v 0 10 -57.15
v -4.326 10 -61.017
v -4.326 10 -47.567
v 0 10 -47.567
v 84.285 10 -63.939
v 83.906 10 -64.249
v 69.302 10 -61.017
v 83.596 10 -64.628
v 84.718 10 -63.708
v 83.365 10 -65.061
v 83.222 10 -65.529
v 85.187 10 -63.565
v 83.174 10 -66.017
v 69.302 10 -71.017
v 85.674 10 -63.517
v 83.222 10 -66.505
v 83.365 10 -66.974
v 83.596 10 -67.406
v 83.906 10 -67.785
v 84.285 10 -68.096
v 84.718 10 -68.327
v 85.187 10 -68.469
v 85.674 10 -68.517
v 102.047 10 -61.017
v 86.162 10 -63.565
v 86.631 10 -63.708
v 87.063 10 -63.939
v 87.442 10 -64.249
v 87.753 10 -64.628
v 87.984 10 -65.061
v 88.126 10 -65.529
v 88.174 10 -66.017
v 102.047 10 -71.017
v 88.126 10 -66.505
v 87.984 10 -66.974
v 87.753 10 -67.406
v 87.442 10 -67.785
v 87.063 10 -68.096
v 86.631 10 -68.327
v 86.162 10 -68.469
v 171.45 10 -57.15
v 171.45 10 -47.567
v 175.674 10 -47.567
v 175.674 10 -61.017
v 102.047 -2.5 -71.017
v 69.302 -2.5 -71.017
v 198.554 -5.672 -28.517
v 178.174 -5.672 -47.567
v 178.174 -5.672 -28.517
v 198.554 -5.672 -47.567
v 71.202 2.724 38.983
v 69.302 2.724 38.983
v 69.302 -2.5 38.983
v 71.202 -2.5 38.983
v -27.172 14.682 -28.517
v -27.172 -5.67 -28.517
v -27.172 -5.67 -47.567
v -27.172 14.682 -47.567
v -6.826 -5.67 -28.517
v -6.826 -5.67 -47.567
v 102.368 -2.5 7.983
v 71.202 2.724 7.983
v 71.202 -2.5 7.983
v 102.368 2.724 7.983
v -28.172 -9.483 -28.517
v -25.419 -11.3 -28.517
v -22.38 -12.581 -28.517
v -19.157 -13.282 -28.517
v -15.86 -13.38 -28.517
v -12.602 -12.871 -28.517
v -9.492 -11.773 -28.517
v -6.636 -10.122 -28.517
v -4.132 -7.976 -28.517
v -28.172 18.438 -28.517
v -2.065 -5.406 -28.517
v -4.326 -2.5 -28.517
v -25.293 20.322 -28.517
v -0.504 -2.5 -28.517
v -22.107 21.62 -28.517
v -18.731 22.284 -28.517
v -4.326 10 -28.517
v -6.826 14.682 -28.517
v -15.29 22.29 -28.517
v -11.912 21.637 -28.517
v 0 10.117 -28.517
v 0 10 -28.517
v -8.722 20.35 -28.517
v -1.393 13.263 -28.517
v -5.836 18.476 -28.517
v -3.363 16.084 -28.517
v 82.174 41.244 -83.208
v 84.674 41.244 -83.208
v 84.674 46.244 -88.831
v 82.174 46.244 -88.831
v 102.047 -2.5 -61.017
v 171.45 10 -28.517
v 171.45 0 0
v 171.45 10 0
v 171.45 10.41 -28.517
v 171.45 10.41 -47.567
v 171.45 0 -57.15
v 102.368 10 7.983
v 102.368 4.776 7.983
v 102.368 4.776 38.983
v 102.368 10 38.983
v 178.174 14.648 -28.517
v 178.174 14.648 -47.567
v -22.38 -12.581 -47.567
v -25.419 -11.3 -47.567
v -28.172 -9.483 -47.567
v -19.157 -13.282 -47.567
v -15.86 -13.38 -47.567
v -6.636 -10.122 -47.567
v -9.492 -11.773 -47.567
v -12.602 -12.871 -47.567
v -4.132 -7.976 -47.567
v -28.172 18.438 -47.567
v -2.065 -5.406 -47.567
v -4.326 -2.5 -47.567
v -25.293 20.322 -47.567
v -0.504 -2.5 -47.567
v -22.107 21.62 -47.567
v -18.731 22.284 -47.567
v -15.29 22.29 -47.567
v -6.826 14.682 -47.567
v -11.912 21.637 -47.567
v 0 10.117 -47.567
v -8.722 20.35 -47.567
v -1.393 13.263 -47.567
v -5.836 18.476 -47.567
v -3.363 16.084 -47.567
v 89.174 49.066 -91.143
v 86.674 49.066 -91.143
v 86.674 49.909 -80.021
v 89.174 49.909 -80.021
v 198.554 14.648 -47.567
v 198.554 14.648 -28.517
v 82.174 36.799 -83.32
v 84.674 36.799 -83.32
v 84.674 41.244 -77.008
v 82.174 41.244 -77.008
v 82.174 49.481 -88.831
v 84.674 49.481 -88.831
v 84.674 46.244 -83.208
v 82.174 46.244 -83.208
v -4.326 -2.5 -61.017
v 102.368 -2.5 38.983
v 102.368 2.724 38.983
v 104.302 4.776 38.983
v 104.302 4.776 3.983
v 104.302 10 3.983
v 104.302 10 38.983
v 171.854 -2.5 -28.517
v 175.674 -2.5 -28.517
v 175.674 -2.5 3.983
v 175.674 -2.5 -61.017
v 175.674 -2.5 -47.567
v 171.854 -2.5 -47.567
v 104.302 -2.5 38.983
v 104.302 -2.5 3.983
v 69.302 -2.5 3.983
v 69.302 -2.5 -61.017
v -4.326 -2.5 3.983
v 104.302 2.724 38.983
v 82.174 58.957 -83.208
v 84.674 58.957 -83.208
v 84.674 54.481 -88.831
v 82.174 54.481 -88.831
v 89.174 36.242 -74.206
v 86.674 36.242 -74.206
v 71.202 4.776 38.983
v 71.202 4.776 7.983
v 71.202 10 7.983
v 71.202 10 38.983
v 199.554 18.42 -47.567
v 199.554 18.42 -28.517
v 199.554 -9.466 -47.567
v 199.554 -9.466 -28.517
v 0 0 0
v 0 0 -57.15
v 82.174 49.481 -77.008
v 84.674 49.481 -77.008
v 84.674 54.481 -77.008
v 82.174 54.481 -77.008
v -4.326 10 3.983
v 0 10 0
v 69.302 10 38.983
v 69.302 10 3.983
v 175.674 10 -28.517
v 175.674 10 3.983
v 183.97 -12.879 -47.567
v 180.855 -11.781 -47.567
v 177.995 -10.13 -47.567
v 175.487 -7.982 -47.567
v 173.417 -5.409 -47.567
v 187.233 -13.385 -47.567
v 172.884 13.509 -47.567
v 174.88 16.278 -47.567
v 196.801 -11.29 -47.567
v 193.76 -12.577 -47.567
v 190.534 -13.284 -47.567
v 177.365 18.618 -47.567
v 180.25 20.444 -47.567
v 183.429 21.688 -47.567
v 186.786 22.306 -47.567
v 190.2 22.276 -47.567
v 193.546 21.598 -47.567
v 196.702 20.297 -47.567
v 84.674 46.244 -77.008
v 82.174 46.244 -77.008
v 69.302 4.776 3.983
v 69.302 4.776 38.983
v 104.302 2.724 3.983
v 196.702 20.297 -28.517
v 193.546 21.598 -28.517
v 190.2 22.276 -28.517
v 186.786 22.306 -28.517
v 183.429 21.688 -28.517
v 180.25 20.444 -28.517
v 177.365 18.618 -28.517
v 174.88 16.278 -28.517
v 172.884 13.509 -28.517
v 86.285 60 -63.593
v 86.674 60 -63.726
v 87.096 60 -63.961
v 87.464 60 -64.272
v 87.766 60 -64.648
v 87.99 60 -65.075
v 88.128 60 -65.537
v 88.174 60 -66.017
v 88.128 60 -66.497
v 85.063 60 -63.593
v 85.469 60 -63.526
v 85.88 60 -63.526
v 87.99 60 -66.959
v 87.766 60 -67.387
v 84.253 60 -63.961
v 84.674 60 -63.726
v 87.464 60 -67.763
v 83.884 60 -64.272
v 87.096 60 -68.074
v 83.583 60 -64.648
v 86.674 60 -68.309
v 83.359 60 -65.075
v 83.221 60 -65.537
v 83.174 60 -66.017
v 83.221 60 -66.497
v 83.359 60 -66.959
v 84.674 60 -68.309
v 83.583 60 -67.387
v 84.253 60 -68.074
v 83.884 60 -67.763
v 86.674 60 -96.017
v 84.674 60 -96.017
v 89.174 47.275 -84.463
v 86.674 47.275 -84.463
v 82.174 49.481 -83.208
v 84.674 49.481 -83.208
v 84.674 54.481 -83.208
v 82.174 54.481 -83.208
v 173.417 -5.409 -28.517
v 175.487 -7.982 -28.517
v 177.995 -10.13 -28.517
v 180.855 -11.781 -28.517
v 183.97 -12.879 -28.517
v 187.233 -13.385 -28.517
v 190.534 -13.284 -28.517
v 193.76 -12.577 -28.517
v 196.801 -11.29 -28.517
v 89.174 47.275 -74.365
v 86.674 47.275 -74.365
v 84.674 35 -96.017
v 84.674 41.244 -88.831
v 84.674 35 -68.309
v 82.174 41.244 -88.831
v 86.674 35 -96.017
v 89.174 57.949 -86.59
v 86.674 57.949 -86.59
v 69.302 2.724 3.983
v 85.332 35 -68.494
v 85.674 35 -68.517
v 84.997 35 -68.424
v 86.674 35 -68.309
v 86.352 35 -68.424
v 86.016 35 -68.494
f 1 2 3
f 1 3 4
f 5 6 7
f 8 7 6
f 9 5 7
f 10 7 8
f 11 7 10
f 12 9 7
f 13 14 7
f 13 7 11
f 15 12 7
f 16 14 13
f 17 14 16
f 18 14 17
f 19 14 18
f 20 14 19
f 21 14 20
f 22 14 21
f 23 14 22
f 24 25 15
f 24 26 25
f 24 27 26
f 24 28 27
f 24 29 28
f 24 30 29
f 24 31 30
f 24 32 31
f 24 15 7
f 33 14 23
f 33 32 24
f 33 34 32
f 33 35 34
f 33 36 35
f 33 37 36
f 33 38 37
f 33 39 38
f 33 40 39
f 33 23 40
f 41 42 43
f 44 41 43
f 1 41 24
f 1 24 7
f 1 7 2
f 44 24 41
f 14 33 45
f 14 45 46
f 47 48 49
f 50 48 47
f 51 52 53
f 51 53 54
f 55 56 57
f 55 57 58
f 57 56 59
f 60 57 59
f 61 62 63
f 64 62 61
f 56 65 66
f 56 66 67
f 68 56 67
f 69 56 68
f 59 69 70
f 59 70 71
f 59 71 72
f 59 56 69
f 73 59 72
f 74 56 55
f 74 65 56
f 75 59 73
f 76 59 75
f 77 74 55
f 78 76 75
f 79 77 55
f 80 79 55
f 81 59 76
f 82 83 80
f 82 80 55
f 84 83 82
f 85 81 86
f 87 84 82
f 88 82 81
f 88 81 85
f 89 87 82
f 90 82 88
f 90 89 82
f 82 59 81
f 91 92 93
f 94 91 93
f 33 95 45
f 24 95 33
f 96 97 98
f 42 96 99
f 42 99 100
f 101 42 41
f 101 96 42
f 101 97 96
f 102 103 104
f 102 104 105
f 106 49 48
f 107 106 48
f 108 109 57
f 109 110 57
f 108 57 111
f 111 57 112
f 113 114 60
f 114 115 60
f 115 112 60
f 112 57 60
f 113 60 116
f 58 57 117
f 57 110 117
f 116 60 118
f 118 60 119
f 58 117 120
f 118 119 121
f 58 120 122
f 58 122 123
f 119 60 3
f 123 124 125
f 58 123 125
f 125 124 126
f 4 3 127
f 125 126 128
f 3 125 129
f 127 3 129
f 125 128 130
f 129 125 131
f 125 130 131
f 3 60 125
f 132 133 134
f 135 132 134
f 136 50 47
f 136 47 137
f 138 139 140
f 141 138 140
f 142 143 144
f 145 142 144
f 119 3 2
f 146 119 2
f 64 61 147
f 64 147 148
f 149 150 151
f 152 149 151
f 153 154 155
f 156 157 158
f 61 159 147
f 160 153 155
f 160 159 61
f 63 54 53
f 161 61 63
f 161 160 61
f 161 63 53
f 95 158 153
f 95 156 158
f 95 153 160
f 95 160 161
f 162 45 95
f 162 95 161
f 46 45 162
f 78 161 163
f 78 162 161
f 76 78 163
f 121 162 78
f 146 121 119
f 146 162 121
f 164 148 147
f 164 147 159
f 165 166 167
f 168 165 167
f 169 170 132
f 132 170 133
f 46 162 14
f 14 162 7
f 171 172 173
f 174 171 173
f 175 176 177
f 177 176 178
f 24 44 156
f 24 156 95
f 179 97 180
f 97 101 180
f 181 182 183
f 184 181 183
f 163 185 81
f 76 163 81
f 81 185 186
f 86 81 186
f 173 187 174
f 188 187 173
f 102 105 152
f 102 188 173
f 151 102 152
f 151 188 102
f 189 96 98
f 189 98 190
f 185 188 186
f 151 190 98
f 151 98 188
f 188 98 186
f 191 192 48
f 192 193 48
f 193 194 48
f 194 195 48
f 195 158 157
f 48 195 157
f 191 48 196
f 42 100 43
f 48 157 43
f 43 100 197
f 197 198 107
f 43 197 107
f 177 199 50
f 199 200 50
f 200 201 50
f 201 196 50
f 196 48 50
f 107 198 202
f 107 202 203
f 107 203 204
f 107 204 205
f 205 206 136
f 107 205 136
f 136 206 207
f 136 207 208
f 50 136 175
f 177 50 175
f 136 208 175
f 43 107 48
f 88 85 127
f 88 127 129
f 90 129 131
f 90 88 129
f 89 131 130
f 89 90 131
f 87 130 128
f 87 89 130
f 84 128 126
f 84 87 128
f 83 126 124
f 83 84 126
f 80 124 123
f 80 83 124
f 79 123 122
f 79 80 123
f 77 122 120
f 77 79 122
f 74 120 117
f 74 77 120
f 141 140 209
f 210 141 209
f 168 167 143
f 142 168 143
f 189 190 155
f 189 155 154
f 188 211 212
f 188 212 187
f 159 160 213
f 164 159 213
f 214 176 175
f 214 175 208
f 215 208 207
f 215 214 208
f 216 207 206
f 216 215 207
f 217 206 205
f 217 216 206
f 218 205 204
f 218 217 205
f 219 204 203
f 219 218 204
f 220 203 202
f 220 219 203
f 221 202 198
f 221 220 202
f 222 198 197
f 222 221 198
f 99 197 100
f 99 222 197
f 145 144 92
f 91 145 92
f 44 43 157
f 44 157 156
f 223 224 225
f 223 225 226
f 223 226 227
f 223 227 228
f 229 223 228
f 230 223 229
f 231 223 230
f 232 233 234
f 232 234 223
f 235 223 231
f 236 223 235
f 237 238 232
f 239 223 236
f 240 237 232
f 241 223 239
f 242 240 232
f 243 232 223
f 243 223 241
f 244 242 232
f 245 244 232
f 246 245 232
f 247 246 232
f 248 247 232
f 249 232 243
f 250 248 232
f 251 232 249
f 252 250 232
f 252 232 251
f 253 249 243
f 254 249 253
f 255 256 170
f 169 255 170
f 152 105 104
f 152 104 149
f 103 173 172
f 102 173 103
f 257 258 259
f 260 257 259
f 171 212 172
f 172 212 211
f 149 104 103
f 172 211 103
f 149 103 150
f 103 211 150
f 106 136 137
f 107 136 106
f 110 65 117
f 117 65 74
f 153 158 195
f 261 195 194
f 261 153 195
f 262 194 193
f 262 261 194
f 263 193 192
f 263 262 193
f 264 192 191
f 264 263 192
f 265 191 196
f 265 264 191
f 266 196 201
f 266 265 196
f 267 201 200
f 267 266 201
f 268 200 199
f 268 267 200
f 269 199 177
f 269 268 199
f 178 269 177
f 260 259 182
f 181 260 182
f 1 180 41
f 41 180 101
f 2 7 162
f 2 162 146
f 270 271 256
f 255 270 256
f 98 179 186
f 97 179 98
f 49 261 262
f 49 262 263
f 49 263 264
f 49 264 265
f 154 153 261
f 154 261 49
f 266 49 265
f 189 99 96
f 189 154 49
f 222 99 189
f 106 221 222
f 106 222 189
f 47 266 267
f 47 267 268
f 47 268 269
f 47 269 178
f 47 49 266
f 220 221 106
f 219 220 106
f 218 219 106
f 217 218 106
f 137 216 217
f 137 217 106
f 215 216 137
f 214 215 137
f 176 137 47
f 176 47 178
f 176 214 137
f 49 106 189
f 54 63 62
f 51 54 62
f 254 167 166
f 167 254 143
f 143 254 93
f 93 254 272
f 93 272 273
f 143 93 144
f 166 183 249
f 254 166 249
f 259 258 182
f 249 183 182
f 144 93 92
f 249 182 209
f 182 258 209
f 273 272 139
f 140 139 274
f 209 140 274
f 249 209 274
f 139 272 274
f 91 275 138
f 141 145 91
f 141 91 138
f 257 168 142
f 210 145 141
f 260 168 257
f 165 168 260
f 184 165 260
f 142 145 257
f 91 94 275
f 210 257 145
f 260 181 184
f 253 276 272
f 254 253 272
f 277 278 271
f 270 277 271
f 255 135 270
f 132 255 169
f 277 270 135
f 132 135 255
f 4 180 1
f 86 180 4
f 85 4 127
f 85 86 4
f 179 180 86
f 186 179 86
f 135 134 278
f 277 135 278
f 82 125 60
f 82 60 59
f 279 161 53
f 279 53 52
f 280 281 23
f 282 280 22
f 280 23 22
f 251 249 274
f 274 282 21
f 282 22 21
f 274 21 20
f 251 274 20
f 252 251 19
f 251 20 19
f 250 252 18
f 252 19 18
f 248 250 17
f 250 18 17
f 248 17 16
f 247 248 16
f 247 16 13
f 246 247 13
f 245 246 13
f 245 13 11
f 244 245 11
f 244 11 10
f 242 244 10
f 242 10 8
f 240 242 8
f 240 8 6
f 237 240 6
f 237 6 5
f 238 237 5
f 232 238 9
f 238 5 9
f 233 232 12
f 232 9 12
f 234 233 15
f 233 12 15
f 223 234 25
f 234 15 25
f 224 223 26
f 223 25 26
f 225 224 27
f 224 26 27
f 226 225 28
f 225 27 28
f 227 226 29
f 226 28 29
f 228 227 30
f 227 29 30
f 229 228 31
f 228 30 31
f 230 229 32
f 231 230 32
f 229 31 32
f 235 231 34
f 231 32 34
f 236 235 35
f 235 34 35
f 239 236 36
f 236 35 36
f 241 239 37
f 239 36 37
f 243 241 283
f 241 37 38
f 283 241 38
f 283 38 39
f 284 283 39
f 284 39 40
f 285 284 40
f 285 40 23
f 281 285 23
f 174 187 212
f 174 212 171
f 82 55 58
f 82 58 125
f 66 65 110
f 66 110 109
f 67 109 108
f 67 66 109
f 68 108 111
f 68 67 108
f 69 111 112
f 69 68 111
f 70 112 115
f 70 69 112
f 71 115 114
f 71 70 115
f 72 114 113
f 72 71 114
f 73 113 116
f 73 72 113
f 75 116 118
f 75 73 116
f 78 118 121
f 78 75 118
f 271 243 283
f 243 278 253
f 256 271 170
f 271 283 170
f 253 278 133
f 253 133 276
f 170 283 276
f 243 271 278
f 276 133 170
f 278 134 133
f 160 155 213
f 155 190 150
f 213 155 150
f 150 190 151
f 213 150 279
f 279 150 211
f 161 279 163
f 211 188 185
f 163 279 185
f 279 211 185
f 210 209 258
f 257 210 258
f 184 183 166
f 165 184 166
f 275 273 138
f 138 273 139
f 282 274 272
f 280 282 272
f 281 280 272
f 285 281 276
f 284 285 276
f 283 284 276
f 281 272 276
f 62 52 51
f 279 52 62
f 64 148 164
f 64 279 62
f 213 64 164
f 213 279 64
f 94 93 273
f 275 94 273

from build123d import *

# Parameters (mm, degrees)
SKETCH1_W            = 180
SKETCH1_H            = 65
SKETCH1_W_2          = 171.45
SKETCH1_H_2          = 57.15
BOSS_EXTRUDE1_DEPTH  = 10
SKETCH2_W            = 180
SKETCH2_H            = 65
BOSS_EXTRUDE2_DEPTH  = 2.5
SKETCH3_W            = 19.05
SKETCH3_H            = 4.647704017
SKETCH3_H_2          = 3.172295983
BOSS_EXTRUDE3_DEPTH  = 2.5
SKETCH4_W            = 2.440634246
SKETCH4_H            = 20.32
BOSS_EXTRUDE4_DEPTH  = 19.05
SKETCH5_W            = 19.05
SKETCH5_H            = 25.298590684
BOSS_EXTRUDE5_DEPTH  = 2.5
BOSS_EXTRUDE6_DEPTH  = 19.05
SKETCH7_W            = 35
SKETCH7_H            = 5.223578232
BOSS_EXTRUDE7_DEPTH  = 4
SKETCH8_W            = 1.900028328
SKETCH8_H            = 5.223578232
SKETCH8_W_2          = 1.933775308
BOSS_EXTRUDE8_DEPTH  = 35
SKETCH9_W            = 25.32
SKETCH9_H            = 2.501981816
BOSS_EXTRUDE9_DEPTH  = 19.05
SKETCH10_W           = 20.346164675
SKETCH10_H           = 20.35236298
SKETCH10_W_2         = 20.379365754
SKETCH10_H_2         = 20.32
BOSS_EXTRUDE10_DEPTH = 19.05
SKETCH11_W           = 21.053847509
SKETCH11_H           = 26.24333769
SKETCH11_W_2         = 20.65238494
SKETCH11_H_2         = 27.151183987
CUT_EXTRUDE1_DEPTH   = 219.146485719
SKETCH12_W           = 32.74513921
SKETCH12_H           = 12.5
BOSS_EXTRUDE11_DEPTH = 10
SKETCH13_R           = 2.5
BOSS_EXTRUDE12_DEPTH = 50
BOSS_EXTRUDE13_START = -25
BOSS_EXTRUDE13_DEPTH = 25
BOSS_EXTRUDE14_DEPTH = 2.5
BOSS_EXTRUDE15_DEPTH = 2.5


with BuildPart() as part:
    # Sketch1 → Boss-Extrude1 (new body)
    with BuildSketch(Plane(origin=(0, 0, 0), x_dir=(1, 0, 0), z_dir=(0, 1, 0))):
        with Locations((85.674229947, 28.51722294)):
            Rectangle(SKETCH1_W, SKETCH1_H)
        with Locations((85.725, 28.575)):
            Rectangle(SKETCH1_W_2, SKETCH1_H_2, mode=Mode.SUBTRACT)
    extrude(amount=BOSS_EXTRUDE1_DEPTH)

    # Sketch2 → Boss-Extrude2 (add)
    with BuildSketch(Plane(origin=(0, 0, 0), x_dir=(-1, 0, 0), z_dir=(0, -1, 0))):
        with Locations((-85.674229947, 28.51722294)):
            Rectangle(SKETCH2_W, SKETCH2_H)
    extrude(amount=BOSS_EXTRUDE2_DEPTH)

    # Sketch3 → Boss-Extrude3 (add)
    with BuildSketch(Plane(origin=(175.674229947, 0, 0), x_dir=(0, 0, -1), z_dir=(1, 0, 0))):
        with Locations((38.04222294, 12.323852009)):
            Rectangle(SKETCH3_W, SKETCH3_H)
        Polygon((28.51722294, 10), (28.51722294, 3.75), (28.51722294, -2.5), (47.56722294, -2.5), (47.56722294, 10), align=None)
        with Locations((38.04222294, -4.086147992)):
            Rectangle(SKETCH3_W, SKETCH3_H_2)
    extrude(amount=BOSS_EXTRUDE3_DEPTH)

    # Sketch4 → Boss-Extrude4 (add)
    with BuildSketch(Plane(origin=(0, 0, -47.56722294), x_dir=(-1, 0, 0), z_dir=(0, 0, -1))):
        Polygon((-200.994229947, 17.126484518), (-200.994229947, 14.647704017), (-198.553595701, 14.647704017), (-178.174229947, 14.647704017), (-175.674229947, 14.647704017), (-175.674229947, 17.126484518), align=None)
        with Locations((-199.773912824, 4.487704017)):
            Rectangle(SKETCH4_W, SKETCH4_H)
        Polygon((-198.553595701, -5.672295983), (-200.994229947, -5.672295983), (-200.994229947, -8.172106166), (-175.674229947, -8.172106166), (-175.674229947, -5.672295983), (-178.174229947, -5.672295983), align=None)
    extrude(amount=-BOSS_EXTRUDE4_DEPTH)

    # Sketch5 → Boss-Extrude5 (add)
    with BuildSketch(Plane.ZY.offset(4.325770053)):
        with Locations((-38.04222294, 4.477189176)):
            Rectangle(SKETCH5_W, SKETCH5_H)
    extrude(amount=BOSS_EXTRUDE5_DEPTH)

    # Sketch6 → Boss-Extrude6 (add)
    with BuildSketch(Plane.XY.offset(-28.51722294)):
        Polygon((-29.645770053, -8.172106166), (-27.171934728, -8.172106166), (-27.171934728, 14.68223863), (-4.325770053, 14.68223863), (-4.325770053, 17.115716116), (-29.645770053, 17.115716116), align=None)
    extrude(amount=-BOSS_EXTRUDE6_DEPTH)

    # Sketch7 → Boss-Extrude7 (add)
    with BuildSketch(Plane.XY.offset(3.98277706)):
        with Locations((86.801660342, 7.388210884)):
            Rectangle(SKETCH7_W, SKETCH7_H)
        with Locations((86.801660342, 0.111789116)):
            Rectangle(SKETCH7_W, SKETCH7_H)
    extrude(amount=BOSS_EXTRUDE7_DEPTH)

    # Sketch8 → Boss-Extrude8 (add)
    with BuildSketch(Plane.XY.offset(3.98277706)):
        with Locations((70.251674506, 7.388210884)):
            Rectangle(SKETCH8_W, SKETCH8_H)
        with Locations((70.251674506, 0.111789116)):
            Rectangle(SKETCH8_W, SKETCH8_H)
        with Locations((103.334772688, 0.111789116)):
            Rectangle(SKETCH8_W_2, SKETCH8_H)
        with Locations((103.334772688, 7.388210884)):
            Rectangle(SKETCH8_W_2, SKETCH8_H)
    extrude(amount=BOSS_EXTRUDE8_DEPTH)

    # Sketch9 → Boss-Extrude9 (add)
    with BuildSketch(Plane.XY.offset(-28.51722294)):
        with Locations((-16.985770053, -6.921115258)):
            Rectangle(SKETCH9_W, SKETCH9_H)
    extrude(amount=-BOSS_EXTRUDE9_DEPTH)

    # Sketch10 → Boss-Extrude10 (add)
    # profile 1 of 2: a face of its own
    with BuildSketch(Plane.XY.offset(-28.51722294)):
        with BuildLine():
            ThreePointArc((0, 10.117261054), (-34.872965087, 4.477189176), (0, -1.162882702))
            Line((0, -1.162882702), (0, 10.117261054))
        make_face()
        with Locations((-16.998852391, 4.50605714)):
            Rectangle(SKETCH10_W, SKETCH10_H, mode=Mode.SUBTRACT)
    # profile 2 of 2: a face of its own
    with BuildSketch(Plane.XY.offset(-28.51722294)):
        with BuildLine():
            Line((171.45, 10.410405146), (171.45, -1.456026794))
            ThreePointArc((171.45, -1.456026794), (206.230605911, 4.477189176), (171.45, 10.410405146))
        make_face()
        with Locations((188.363912824, 4.487704017)):
            Rectangle(SKETCH10_W_2, SKETCH10_H_2, mode=Mode.SUBTRACT)
    extrude(amount=-BOSS_EXTRUDE10_DEPTH)

    # Sketch11 → Cut-Extrude1 (cut, through all)
    with BuildSketch(Plane.XY.offset(-28.51722294)):
        with BuildLine():
            Line((-53.173508904, 4.50605714), (-34.8729418, 4.50605714))
            ThreePointArc((-34.8729418, 4.50605714), (-33.104696604, 12.232894836), (-28.171934728, 18.437616596))
            Line((-28.171934728, 18.437616596), (-28.171934728, 29.671454137))
            Line((-28.171934728, 29.671454137), (-53.381023661, 29.671454137))
            Line((-53.381023661, 29.671454137), (-53.381023661, 4.50605714))
            Line((-53.381023661, 4.50605714), (-53.173508904, 4.50605714))
        make_face()
        with BuildLine():
            ThreePointArc((-29.645770053, -8.161337764), (-33.520115813, -2.347890017), (-34.8729418, 4.50605714))
            Line((-34.8729418, 4.50605714), (-53.173508904, 4.50605714))
            Line((-53.173508904, 4.50605714), (-53.173508904, -18.45755641))
            Line((-53.173508904, -18.45755641), (-28.171934728, -18.45755641))
            Line((-28.171934728, -18.45755641), (-28.171934728, -9.483238244))
            ThreePointArc((-28.171934728, -9.483238244), (-28.921483903, -8.847768144), (-29.635015336, -8.172106166))
            Line((-29.635015336, -8.172106166), (-29.645770053, -8.172106166))
            Line((-29.645770053, -8.172106166), (-29.645770053, -8.161337764))
        make_face()
        with BuildLine():
            Line((-34.8729418, 4.50605714), (-28.171934728, 4.50605714))
            Line((-28.171934728, 4.50605714), (-28.171934728, 18.437616596))
            ThreePointArc((-28.171934728, 18.437616596), (-33.104696604, 12.232894836), (-34.8729418, 4.50605714))
        make_face()
        with BuildLine():
            Line((-28.171934728, -9.483238244), (-28.171934728, 4.50605714))
            Line((-28.171934728, 4.50605714), (-34.8729418, 4.50605714))
            ThreePointArc((-34.8729418, 4.50605714), (-33.520115813, -2.347890017), (-29.645770053, -8.161337764))
            Line((-29.645770053, -8.161337764), (-29.645770053, -8.172106166))
            Line((-29.645770053, -8.172106166), (-29.635015336, -8.172106166))
            ThreePointArc((-29.635015336, -8.172106166), (-28.921483903, -8.847768144), (-28.171934728, -9.483238244))
        make_face()
        with Locations((210.080519455, 17.609372862)):
            Rectangle(SKETCH11_W, SKETCH11_H)
        with Locations((209.879788171, -9.087887976)):
            Rectangle(SKETCH11_W_2, SKETCH11_H_2)
    extrude(amount=-CUT_EXTRUDE1_DEPTH, mode=Mode.SUBTRACT)

    # Sketch12 → Boss-Extrude11 (add)
    with BuildSketch(Plane(origin=(0, 0, -61.01722294), x_dir=(-1, 0, 0), z_dir=(0, 0, -1))):
        with Locations((-85.674229947, 3.75)):
            Rectangle(SKETCH12_W, SKETCH12_H)
    extrude(amount=BOSS_EXTRUDE11_DEPTH)

    # Sketch13 → Boss-Extrude12 (add)
    with BuildSketch(Plane(origin=(0, 10, 0), x_dir=(1, 0, 0), z_dir=(0, 1, 0))):
        with Locations(Location((85.674229947, 66.01722294, 0), (0, 0, 90))):
            Circle(SKETCH13_R)
    extrude(amount=BOSS_EXTRUDE12_DEPTH)

    # Sketch14 → Boss-Extrude13 (add)
    with BuildSketch(Plane(origin=(0, 60, 0), x_dir=(1, 0, 0), z_dir=(0, 1, 0)).offset(BOSS_EXTRUDE13_START)):
        with BuildLine():
            Line((84.674229947, 68.308510788), (84.674229947, 66.01722294))
            Line((84.674229947, 66.01722294), (86.674229947, 66.01722294))
            Line((86.674229947, 66.01722294), (86.674229947, 68.308510788))
            ThreePointArc((86.674229947, 68.308510788), (85.674229947, 68.51722294), (84.674229947, 68.308510788))
        make_face()
        with BuildLine():
            Line((86.674229947, 66.01722294), (84.674229947, 66.01722294))
            Line((84.674229947, 66.01722294), (84.674229947, 63.725935093))
            ThreePointArc((84.674229947, 63.725935093), (85.674229947, 63.51722294), (86.674229947, 63.725935093))
            Line((86.674229947, 63.725935093), (86.674229947, 66.01722294))
        make_face()
        with BuildLine():
            Line((84.674229947, 96.01722294), (84.674229947, 68.308510788))
            ThreePointArc((84.674229947, 68.308510788), (85.674229947, 68.51722294), (86.674229947, 68.308510788))
            Line((86.674229947, 68.308510788), (86.674229947, 96.01722294))
            Line((86.674229947, 96.01722294), (84.674229947, 96.01722294))
        make_face()
    extrude(amount=BOSS_EXTRUDE13_DEPTH)

    # Sketch15 → Boss-Extrude14 (add)
    with BuildSketch(Plane(origin=(86.674229947, 0, 0), x_dir=(0, 0, -1), z_dir=(1, 0, 0))):
        Polygon((86.590113791, 57.949199479), (74.364516101, 47.274610451), (84.462974004, 47.274610451), (74.205725369, 36.241603515), (91.143359189, 49.065886488), (80.020746684, 49.909078542), align=None)
    extrude(amount=BOSS_EXTRUDE14_DEPTH)

    # Sketch16 → Boss-Extrude15 (add)
    with BuildSketch(Plane.ZY.offset(-84.674229947)):
        Polygon((-88.831415439, 54.480665097), (-88.831415439, 49.480665097), (-83.207775472, 46.244467981), (-83.207775472, 41.244467981), (-88.831415439, 46.244467981), (-88.831415439, 41.244467981), (-83.320105395, 36.799352745), (-77.00848732, 41.244467981), (-77.00848732, 46.244467981), (-83.207775472, 49.480665097), (-83.207775472, 54.480665097), (-77.00848732, 49.480665097), (-77.00848732, 54.480665097), (-83.207775472, 58.956719844), align=None)
    extrude(amount=BOSS_EXTRUDE15_DEPTH)


solid = part.part
